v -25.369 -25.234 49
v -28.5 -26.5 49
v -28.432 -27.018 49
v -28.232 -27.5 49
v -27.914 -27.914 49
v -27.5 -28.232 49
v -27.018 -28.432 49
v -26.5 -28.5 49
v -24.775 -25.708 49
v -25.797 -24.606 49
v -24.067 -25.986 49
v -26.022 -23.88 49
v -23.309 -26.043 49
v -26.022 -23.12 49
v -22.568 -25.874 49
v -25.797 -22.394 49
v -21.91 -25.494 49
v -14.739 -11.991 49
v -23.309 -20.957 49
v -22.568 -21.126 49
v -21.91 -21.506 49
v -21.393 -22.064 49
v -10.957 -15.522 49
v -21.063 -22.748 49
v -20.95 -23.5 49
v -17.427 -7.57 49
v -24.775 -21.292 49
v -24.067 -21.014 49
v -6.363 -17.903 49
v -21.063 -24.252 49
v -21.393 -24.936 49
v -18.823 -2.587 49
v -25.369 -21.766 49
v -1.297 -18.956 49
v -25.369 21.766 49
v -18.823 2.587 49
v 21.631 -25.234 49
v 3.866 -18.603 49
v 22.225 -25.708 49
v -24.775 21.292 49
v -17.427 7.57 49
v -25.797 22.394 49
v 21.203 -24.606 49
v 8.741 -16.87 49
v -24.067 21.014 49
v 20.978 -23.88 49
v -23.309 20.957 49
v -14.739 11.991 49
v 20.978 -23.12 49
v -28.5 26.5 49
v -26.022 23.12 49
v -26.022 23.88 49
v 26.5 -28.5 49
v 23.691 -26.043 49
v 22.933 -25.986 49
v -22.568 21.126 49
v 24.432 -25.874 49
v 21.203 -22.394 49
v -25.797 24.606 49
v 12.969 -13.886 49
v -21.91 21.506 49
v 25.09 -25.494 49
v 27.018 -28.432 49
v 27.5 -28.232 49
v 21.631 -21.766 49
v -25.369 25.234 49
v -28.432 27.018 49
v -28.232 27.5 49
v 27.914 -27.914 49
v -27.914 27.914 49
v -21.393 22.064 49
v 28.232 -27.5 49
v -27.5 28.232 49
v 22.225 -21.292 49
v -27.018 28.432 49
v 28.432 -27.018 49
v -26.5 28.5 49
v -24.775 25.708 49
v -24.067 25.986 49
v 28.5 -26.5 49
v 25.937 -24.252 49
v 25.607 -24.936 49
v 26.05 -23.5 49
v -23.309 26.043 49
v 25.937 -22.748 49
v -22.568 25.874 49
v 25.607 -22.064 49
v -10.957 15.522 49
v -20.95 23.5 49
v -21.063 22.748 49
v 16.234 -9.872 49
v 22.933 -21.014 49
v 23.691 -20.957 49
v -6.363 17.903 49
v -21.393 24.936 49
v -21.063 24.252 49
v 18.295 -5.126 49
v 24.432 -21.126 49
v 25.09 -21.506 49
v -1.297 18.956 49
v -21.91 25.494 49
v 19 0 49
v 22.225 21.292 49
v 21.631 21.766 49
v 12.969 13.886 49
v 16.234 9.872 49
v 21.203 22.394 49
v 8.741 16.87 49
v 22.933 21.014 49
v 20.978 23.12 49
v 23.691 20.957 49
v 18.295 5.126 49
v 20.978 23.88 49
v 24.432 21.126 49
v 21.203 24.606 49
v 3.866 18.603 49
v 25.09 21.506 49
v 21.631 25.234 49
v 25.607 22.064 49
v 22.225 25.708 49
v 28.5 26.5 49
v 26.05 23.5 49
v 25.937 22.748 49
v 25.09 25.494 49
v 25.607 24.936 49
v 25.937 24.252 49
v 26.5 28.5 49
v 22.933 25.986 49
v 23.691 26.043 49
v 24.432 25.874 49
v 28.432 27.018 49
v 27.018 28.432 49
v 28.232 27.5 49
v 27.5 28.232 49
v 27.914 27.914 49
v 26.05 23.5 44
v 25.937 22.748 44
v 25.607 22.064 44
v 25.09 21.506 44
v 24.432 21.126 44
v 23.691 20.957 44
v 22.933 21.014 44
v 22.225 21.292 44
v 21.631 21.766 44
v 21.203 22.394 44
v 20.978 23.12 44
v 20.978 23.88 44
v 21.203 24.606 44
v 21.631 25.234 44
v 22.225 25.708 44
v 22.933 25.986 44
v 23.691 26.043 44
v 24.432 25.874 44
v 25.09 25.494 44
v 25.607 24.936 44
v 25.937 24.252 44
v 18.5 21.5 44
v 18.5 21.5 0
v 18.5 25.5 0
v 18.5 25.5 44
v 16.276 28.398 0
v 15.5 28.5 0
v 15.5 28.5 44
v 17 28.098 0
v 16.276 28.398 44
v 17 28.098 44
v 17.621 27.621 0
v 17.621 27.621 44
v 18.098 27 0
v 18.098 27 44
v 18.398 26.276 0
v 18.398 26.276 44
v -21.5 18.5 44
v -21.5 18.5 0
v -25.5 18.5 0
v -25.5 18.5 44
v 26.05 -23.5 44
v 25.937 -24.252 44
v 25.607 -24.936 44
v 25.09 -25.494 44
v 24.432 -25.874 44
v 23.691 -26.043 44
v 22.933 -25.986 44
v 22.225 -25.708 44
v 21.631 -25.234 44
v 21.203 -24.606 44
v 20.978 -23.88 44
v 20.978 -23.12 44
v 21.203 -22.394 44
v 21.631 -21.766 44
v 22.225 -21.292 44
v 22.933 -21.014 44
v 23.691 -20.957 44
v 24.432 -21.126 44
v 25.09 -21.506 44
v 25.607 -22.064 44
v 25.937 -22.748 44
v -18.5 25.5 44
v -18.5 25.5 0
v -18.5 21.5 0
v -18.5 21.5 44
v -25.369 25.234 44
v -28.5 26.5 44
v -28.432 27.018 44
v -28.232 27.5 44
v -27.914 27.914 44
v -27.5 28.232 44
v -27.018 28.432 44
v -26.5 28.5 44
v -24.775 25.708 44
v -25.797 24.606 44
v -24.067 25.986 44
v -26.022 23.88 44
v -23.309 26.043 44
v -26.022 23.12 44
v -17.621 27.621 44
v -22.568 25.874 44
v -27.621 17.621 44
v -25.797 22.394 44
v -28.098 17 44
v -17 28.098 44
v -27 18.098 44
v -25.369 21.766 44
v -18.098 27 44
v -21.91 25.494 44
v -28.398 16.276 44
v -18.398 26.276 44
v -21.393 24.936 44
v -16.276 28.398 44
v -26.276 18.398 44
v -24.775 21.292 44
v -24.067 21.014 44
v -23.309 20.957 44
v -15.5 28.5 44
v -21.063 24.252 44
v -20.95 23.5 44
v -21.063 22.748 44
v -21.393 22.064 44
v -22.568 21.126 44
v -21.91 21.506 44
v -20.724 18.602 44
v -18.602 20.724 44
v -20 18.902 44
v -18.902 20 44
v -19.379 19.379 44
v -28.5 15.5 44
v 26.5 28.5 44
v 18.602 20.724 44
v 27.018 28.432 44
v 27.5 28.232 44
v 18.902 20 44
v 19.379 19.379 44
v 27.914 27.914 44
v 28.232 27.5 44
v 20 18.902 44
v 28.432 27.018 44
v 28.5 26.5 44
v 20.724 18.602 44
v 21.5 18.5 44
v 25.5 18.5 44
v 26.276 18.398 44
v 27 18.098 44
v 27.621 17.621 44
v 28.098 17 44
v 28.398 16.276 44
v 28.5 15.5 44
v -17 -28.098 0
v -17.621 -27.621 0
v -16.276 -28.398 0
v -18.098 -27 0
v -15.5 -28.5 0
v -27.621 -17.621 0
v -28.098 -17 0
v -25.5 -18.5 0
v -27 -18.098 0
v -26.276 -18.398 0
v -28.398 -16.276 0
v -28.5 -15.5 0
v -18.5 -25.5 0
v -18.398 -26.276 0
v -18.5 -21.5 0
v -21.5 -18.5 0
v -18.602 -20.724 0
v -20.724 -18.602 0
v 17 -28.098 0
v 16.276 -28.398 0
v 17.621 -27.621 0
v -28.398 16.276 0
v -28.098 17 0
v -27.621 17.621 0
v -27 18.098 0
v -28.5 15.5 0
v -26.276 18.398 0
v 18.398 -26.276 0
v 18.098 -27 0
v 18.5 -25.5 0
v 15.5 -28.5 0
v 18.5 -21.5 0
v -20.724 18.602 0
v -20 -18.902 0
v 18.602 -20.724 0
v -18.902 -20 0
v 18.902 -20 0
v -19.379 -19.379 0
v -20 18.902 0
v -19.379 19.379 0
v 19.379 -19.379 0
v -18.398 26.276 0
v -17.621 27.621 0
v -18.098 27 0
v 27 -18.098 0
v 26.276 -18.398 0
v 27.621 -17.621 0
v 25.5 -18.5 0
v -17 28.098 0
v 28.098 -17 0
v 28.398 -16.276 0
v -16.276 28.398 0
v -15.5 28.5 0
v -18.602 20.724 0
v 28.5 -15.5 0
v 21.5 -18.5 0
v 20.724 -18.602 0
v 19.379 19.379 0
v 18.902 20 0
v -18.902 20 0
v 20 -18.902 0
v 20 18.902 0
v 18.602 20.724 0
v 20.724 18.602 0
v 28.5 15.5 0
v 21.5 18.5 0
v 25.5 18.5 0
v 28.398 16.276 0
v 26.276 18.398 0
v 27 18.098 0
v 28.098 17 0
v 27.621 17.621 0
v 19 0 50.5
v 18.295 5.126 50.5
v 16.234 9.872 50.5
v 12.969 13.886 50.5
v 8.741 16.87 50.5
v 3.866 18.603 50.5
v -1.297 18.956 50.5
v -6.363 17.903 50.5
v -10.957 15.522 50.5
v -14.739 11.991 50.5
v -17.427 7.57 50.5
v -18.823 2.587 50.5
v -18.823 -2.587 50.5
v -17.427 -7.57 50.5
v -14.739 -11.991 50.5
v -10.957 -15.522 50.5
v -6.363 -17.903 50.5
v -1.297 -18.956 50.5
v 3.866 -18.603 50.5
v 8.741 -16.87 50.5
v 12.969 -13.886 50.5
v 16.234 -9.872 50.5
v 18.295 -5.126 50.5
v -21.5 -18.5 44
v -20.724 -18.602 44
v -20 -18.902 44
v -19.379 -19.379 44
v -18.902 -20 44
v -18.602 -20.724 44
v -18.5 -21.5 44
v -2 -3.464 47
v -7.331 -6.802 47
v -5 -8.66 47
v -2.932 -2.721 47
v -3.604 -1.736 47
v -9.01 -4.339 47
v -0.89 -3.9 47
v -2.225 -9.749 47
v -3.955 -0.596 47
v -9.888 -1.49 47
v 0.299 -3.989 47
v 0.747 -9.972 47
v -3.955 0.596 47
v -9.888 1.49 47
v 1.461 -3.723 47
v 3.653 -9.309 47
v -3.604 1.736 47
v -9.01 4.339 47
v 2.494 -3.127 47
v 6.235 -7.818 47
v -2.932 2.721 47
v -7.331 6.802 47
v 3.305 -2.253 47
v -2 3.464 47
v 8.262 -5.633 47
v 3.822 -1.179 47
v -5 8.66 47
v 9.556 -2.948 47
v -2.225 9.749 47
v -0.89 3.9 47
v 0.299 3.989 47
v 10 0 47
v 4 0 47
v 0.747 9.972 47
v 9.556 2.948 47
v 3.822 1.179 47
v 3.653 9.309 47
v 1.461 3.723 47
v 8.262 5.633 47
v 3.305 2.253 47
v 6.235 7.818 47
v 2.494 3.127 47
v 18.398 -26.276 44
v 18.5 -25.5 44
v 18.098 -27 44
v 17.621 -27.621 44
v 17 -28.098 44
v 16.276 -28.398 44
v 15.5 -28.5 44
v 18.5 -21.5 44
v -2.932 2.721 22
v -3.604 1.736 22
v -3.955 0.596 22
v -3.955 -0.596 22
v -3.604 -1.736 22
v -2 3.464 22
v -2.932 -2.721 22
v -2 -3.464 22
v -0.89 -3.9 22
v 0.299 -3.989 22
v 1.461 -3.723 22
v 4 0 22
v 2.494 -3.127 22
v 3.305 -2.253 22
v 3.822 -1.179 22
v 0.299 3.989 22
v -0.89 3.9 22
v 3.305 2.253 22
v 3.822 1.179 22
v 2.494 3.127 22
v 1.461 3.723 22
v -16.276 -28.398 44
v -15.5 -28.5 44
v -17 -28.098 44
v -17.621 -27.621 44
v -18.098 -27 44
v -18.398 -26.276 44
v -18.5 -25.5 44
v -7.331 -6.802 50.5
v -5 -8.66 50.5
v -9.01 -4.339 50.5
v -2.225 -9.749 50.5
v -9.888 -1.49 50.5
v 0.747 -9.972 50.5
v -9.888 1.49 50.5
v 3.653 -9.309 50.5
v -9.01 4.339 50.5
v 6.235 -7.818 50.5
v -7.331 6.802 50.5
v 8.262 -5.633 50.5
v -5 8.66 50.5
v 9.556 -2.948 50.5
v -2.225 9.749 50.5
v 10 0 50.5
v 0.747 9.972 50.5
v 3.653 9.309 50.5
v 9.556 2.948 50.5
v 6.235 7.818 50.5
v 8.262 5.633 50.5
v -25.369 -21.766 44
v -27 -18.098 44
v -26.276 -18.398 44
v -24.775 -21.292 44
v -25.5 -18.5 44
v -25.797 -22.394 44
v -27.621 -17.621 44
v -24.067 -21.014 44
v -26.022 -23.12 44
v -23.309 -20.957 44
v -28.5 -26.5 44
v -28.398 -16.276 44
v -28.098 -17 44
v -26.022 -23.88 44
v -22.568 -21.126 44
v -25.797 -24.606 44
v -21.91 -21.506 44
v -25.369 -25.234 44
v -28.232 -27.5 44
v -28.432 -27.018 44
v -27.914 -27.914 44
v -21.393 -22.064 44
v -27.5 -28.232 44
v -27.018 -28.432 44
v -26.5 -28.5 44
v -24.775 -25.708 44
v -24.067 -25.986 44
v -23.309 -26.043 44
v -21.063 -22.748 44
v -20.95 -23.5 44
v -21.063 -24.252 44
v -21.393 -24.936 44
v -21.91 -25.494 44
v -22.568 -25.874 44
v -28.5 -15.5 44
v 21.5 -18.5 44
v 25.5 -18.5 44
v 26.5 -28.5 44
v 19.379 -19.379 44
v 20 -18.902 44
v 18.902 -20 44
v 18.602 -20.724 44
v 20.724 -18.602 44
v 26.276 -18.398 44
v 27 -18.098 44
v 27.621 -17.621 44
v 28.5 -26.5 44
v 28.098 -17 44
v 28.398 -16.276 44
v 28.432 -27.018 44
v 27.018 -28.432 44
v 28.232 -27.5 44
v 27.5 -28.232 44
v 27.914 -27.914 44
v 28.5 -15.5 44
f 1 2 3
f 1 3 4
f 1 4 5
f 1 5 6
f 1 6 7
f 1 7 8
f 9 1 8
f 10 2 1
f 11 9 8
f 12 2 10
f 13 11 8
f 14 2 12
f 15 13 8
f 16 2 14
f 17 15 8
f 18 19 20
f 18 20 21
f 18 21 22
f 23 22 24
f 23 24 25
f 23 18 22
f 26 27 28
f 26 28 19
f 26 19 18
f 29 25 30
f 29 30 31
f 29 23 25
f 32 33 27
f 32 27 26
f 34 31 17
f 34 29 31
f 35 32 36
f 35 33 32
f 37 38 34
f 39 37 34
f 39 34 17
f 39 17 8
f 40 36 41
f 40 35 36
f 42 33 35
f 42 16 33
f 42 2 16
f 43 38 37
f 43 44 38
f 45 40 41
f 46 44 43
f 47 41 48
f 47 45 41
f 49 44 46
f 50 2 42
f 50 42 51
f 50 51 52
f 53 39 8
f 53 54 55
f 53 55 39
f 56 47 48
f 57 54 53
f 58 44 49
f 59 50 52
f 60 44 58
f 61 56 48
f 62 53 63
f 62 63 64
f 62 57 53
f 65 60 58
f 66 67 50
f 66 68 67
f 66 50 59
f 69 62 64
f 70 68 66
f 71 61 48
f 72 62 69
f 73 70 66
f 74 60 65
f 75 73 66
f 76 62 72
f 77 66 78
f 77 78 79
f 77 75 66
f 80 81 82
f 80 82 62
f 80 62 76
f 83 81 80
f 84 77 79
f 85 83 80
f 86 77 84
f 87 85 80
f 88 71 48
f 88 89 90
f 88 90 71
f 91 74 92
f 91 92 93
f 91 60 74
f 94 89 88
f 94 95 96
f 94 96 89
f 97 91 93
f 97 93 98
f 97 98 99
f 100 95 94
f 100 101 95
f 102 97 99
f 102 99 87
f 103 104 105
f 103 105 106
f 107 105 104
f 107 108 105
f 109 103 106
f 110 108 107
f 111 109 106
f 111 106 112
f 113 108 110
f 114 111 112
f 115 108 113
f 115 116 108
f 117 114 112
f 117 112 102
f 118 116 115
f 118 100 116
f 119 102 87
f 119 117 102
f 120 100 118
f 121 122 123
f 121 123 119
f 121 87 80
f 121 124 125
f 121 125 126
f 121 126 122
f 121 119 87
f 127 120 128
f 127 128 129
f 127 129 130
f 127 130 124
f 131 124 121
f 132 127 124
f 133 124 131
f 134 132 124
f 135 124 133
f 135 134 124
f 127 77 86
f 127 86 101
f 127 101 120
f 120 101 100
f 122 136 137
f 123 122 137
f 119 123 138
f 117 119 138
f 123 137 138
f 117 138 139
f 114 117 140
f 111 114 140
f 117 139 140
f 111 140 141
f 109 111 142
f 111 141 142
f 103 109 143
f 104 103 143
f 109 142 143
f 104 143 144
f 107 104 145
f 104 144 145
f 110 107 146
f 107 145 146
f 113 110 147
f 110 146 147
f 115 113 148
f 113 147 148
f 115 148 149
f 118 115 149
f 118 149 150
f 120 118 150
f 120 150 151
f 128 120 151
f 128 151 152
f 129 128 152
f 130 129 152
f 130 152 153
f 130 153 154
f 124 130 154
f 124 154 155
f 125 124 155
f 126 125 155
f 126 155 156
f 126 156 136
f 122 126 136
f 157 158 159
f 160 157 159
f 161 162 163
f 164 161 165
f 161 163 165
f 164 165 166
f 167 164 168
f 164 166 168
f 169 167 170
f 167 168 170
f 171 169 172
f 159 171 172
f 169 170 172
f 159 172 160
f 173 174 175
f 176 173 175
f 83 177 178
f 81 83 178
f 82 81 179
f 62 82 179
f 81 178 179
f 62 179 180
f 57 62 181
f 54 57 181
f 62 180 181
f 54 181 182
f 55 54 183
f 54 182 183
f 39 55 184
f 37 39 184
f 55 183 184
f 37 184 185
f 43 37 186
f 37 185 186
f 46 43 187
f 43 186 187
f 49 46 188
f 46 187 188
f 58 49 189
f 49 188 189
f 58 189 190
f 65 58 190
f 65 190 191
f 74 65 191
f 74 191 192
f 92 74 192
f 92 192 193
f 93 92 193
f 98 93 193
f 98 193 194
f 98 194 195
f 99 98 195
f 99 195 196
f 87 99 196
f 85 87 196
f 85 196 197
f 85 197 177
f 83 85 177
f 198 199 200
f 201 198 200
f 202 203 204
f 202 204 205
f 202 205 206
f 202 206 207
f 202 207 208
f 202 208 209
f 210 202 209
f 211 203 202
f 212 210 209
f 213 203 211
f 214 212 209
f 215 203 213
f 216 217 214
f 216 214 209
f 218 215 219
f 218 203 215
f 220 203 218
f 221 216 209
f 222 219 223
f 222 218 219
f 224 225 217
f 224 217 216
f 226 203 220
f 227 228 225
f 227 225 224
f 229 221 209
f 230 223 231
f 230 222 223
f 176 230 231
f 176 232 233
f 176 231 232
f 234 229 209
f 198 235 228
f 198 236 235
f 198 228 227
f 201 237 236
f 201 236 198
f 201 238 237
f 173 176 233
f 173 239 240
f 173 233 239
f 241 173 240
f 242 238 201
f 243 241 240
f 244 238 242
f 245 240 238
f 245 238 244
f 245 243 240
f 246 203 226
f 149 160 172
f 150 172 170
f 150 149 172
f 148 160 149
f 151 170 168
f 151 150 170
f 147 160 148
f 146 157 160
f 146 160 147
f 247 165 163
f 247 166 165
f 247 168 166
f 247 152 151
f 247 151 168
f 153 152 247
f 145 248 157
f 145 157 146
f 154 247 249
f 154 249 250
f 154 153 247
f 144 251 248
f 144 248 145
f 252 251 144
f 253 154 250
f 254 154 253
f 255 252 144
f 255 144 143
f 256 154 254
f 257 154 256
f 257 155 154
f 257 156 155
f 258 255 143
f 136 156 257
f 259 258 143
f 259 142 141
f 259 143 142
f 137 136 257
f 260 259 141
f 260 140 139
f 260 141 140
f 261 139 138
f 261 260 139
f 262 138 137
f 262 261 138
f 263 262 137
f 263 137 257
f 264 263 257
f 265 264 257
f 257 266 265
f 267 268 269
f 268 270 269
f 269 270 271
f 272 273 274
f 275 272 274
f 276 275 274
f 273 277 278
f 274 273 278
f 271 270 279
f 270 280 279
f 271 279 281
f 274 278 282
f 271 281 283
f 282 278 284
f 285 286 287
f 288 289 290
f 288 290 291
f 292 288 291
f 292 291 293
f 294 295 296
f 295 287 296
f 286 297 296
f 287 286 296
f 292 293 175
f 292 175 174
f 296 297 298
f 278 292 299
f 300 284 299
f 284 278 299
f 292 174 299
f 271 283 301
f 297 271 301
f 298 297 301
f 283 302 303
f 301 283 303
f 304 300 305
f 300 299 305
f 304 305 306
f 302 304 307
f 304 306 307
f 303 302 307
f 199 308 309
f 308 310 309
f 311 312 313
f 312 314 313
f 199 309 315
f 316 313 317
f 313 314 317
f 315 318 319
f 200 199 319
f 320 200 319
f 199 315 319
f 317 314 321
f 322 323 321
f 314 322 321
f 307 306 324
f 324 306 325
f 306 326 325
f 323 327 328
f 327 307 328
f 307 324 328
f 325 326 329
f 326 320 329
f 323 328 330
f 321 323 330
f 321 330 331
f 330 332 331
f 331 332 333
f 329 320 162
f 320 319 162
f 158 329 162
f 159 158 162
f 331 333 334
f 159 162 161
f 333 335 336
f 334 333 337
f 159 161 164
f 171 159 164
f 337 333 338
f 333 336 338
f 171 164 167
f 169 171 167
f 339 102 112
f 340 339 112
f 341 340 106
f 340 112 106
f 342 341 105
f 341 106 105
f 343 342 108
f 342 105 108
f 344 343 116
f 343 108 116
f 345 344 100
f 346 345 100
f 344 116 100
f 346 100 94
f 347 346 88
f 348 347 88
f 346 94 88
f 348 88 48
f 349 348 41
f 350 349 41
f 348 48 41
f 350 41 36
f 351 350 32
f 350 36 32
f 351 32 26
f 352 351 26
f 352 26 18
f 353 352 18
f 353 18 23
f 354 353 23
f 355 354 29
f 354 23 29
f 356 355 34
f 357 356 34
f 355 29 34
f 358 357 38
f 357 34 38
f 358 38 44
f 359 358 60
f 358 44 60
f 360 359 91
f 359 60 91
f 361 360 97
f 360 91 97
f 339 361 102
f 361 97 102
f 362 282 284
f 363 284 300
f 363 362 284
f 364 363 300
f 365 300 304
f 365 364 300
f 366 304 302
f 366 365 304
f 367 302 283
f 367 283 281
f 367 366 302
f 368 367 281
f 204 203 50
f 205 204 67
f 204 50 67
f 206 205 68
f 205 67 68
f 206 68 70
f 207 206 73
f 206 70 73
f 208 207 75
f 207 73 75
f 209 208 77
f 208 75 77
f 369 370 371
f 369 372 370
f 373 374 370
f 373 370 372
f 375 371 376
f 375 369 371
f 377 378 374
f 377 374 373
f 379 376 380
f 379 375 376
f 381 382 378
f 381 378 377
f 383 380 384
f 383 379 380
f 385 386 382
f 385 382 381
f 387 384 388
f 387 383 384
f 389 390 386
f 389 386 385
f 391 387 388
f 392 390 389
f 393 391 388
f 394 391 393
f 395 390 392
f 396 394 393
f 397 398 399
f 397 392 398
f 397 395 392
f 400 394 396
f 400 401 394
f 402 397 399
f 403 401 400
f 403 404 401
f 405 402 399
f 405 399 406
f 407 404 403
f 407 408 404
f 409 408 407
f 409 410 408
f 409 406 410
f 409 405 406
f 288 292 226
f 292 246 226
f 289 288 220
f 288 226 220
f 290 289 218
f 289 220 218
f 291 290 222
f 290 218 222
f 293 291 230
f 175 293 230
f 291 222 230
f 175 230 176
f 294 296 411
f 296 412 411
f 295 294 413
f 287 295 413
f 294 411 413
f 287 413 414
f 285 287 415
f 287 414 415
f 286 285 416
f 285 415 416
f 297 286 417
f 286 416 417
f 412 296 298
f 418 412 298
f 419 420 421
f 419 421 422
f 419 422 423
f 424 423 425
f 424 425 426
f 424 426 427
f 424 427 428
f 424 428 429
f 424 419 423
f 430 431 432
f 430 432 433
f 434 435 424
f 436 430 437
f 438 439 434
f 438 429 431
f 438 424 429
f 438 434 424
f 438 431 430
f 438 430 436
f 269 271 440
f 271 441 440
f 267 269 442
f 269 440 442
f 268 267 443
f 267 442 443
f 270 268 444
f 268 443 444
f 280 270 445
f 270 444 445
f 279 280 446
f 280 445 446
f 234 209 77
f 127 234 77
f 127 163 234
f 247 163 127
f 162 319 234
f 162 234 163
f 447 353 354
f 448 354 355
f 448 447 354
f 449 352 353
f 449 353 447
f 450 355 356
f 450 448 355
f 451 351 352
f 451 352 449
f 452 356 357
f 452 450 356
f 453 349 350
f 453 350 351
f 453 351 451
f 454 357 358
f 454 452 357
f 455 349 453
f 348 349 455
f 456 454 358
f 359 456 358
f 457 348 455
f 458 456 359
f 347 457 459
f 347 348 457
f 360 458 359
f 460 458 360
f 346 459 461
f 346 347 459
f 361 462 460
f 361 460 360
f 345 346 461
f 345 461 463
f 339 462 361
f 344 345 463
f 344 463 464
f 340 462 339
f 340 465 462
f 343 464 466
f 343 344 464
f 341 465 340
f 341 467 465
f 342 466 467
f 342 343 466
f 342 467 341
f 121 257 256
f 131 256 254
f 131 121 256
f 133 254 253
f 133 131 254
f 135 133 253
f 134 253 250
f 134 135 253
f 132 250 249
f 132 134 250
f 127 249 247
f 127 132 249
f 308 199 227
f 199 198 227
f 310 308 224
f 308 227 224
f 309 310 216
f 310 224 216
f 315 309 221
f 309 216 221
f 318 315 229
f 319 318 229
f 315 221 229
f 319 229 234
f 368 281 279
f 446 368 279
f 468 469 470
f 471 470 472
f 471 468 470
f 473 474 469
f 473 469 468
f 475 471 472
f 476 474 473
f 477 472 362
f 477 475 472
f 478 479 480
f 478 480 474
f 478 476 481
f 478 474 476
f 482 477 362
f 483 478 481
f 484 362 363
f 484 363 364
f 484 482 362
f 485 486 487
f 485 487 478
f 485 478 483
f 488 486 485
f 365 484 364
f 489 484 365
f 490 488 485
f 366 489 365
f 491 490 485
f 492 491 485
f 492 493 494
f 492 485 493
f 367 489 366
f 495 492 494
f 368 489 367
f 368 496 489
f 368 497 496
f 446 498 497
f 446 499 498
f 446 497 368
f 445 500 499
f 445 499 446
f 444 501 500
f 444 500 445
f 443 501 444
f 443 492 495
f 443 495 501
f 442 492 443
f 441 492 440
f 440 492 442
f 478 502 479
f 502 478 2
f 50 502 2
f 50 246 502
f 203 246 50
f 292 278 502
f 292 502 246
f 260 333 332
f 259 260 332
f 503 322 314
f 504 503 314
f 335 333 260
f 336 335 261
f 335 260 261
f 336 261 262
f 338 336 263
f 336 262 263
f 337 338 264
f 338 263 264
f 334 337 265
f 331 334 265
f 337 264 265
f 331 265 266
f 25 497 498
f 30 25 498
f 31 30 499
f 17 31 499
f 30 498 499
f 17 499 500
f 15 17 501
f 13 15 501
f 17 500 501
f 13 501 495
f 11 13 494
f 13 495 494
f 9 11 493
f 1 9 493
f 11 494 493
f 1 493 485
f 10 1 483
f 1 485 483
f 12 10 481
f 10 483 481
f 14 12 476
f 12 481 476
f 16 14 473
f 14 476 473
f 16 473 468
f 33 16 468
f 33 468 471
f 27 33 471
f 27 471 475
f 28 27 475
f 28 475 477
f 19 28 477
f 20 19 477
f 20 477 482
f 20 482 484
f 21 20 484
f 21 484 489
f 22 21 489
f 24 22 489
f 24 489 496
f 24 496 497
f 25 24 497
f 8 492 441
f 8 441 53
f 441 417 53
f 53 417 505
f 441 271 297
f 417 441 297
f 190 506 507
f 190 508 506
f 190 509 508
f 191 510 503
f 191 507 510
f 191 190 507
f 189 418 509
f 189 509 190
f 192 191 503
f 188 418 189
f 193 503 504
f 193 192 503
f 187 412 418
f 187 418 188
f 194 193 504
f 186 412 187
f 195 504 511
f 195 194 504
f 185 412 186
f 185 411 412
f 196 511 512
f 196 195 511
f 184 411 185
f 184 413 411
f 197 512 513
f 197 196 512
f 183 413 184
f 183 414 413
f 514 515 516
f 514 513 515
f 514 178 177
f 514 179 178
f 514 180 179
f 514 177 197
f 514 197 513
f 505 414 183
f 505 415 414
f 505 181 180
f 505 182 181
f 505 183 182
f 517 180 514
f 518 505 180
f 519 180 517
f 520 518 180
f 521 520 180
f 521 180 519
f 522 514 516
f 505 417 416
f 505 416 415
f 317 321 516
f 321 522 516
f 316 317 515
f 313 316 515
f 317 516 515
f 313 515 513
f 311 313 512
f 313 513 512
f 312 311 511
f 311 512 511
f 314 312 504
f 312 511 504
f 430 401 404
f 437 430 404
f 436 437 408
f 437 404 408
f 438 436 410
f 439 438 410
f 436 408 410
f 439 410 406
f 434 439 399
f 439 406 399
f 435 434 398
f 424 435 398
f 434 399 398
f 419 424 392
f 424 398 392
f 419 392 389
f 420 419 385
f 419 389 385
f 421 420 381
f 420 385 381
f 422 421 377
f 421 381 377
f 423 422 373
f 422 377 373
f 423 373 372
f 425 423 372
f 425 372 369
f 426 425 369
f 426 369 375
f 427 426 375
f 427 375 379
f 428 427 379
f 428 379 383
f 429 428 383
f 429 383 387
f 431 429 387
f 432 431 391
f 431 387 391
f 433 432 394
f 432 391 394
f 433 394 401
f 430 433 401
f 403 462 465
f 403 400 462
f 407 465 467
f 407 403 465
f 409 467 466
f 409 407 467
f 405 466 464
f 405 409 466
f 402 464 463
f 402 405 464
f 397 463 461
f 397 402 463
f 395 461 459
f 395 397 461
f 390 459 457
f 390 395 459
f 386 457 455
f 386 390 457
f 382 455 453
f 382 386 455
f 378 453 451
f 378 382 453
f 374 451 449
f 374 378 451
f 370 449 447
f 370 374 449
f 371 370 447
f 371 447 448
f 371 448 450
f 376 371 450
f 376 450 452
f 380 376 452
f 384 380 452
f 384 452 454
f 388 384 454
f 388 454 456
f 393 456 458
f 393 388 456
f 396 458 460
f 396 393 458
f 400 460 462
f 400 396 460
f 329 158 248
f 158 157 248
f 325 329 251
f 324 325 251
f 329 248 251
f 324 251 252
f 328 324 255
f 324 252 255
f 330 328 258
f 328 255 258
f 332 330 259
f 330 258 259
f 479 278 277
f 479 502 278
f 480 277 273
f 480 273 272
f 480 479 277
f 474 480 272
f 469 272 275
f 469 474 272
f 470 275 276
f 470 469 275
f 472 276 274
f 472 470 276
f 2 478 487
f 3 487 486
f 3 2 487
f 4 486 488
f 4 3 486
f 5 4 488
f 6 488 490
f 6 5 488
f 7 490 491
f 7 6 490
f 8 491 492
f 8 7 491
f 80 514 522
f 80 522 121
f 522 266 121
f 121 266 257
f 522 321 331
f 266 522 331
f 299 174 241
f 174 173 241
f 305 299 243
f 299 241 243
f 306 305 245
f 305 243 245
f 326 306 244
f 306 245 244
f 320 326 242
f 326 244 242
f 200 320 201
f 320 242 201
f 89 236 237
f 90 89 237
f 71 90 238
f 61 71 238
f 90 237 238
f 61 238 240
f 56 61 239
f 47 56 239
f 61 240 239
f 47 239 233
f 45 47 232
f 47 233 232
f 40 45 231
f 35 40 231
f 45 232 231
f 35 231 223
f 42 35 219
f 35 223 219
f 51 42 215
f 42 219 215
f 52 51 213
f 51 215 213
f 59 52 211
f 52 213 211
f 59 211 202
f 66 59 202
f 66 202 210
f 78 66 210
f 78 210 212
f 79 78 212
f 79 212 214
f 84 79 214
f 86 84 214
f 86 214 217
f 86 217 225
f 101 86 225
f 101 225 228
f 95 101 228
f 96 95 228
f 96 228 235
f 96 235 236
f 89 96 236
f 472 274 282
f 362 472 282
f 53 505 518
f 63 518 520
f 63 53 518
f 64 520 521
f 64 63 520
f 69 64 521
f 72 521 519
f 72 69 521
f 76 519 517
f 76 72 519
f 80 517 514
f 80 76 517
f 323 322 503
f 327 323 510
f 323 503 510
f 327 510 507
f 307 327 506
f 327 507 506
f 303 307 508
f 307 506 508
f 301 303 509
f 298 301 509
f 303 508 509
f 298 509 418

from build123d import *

# Parameters (mm, degrees)
F0_W      = 57
F0_H      = 57
F1_DEPTH  = 49
F2_R      = 2
F3_R      = 2.55
F4_DEPTH  = 49.001
F5_R      = 2.55
F6_DEPTH  = 44
F7_R      = 3
F8_R      = 10
F9_DEPTH  = 2
F10_R     = 4
F11_DEPTH = 25
F12_R     = 19
F12_R_2   = 10
F13_DEPTH = 1.5


with BuildPart() as f1:
    # F0 (on Top) → F1 (new body)
    with BuildSketch(Plane.XY):
        Rectangle(F0_W, F0_H)
    extrude(amount=F1_DEPTH)

    # F2
    f2_edges = [f1.edges().sort_by_distance(p)[0] for p in [
        (-28.5, -28.5, 24.5),
        (28.5, -28.5, 24.5),
        (28.5, 28.5, 24.5),
        (-28.5, 28.5, 24.5),
    ]]
    fillet(f2_edges, radius=F2_R)

    # F3 (on face) → F4 (cut, through all)
    with BuildSketch(Plane(origin=(0, 0, 0), x_dir=(1, 0, 0), z_dir=(0, 0, -1))):
        with Locations((-23.5, -23.5)):
            Circle(F3_R)
        with Locations((-23.5, 23.5)):
            Circle(F3_R)
        with Locations((23.5, 23.5)):
            Circle(F3_R)
        with Locations((23.5, -23.5)):
            Circle(F3_R)
    extrude(amount=-F4_DEPTH, mode=Mode.SUBTRACT)

    # F5 (on face) → F6 (cut)
    with BuildSketch(Plane(origin=(0, 0, 0), x_dir=(1, 0, 0), z_dir=(0, 0, -1))):
        with BuildLine():
            Line((-26.5, -28.5), (-18.5, -28.5))
            Line((-18.5, -28.5), (-18.5, -18.5))
            Line((-18.5, -18.5), (-28.5, -18.5))
            Line((-28.5, -18.5), (-28.5, -26.5))
            ThreePointArc((-28.5, -26.5), (-27.9142135624, -27.9142135624), (-26.5, -28.5))
        make_face()
        with Locations((-23.5, -23.5)):
            Circle(F5_R, mode=Mode.SUBTRACT)
        with BuildLine():
            Line((28.5, -26.5), (28.5, -18.5))
            Line((28.5, -18.5), (18.5, -18.5))
            Line((18.5, -18.5), (18.5, -28.5))
            Line((18.5, -28.5), (26.5, -28.5))
            ThreePointArc((26.5, -28.5), (27.9142135624, -27.9142135624), (28.5, -26.5))
        make_face()
        with Locations((23.5, -23.5)):
            Circle(F5_R, mode=Mode.SUBTRACT)
        with BuildLine():
            Line((18.5, 18.5), (28.5, 18.5))
            Line((28.5, 18.5), (28.5, 26.5))
            ThreePointArc((28.5, 26.5), (27.9142135624, 27.9142135624), (26.5, 28.5))
            Line((26.5, 28.5), (18.5, 28.5))
            Line((18.5, 28.5), (18.5, 18.5))
        make_face()
        with Locations((23.5, 23.5)):
            Circle(F5_R, mode=Mode.SUBTRACT)
        with BuildLine():
            Line((-18.5, 18.5), (-18.5, 28.5))
            Line((-18.5, 28.5), (-26.5, 28.5))
            ThreePointArc((-26.5, 28.5), (-27.9142135624, 27.9142135624), (-28.5, 26.5))
            Line((-28.5, 26.5), (-28.5, 18.5))
            Line((-28.5, 18.5), (-18.5, 18.5))
        make_face()
        with Locations((-23.5, 23.5)):
            Circle(F5_R, mode=Mode.SUBTRACT)
    extrude(amount=-F6_DEPTH, mode=Mode.SUBTRACT)

    # F7
    f7_edges = [f1.edges().sort_by_distance(p)[0] for p in [
        (-18.5, -18.5, 22),
        (-18.5, -28.5, 22),
        (-28.5, -18.5, 22),
        (-28.5, 18.5, 22),
        (-18.5, 28.5, 22),
        (18.5, -28.5, 22),
        (28.5, -18.5, 22),
        (-18.5, 18.5, 22),
        (28.5, 18.5, 22),
        (18.5, 28.5, 22),
        (18.5, 18.5, 22),
        (18.5, -18.5, 22),
    ]]
    fillet(f7_edges, radius=F7_R)

    # F8 (on face) → F9 (cut)
    with BuildSketch(Plane.XY.offset(49)):
        Circle(F8_R)
    extrude(amount=-F9_DEPTH, mode=Mode.SUBTRACT)

    # F10 (on face) → F11 (cut)
    with BuildSketch(Plane.XY.offset(47)):
        Circle(F10_R)
    extrude(amount=-F11_DEPTH, mode=Mode.SUBTRACT)

    # F12 (on face) → F13 (join)
    with BuildSketch(Plane.XY.offset(49)):
        Circle(F12_R)
        Circle(F12_R_2, mode=Mode.SUBTRACT)
    extrude(amount=F13_DEPTH)


solid = f1.part
